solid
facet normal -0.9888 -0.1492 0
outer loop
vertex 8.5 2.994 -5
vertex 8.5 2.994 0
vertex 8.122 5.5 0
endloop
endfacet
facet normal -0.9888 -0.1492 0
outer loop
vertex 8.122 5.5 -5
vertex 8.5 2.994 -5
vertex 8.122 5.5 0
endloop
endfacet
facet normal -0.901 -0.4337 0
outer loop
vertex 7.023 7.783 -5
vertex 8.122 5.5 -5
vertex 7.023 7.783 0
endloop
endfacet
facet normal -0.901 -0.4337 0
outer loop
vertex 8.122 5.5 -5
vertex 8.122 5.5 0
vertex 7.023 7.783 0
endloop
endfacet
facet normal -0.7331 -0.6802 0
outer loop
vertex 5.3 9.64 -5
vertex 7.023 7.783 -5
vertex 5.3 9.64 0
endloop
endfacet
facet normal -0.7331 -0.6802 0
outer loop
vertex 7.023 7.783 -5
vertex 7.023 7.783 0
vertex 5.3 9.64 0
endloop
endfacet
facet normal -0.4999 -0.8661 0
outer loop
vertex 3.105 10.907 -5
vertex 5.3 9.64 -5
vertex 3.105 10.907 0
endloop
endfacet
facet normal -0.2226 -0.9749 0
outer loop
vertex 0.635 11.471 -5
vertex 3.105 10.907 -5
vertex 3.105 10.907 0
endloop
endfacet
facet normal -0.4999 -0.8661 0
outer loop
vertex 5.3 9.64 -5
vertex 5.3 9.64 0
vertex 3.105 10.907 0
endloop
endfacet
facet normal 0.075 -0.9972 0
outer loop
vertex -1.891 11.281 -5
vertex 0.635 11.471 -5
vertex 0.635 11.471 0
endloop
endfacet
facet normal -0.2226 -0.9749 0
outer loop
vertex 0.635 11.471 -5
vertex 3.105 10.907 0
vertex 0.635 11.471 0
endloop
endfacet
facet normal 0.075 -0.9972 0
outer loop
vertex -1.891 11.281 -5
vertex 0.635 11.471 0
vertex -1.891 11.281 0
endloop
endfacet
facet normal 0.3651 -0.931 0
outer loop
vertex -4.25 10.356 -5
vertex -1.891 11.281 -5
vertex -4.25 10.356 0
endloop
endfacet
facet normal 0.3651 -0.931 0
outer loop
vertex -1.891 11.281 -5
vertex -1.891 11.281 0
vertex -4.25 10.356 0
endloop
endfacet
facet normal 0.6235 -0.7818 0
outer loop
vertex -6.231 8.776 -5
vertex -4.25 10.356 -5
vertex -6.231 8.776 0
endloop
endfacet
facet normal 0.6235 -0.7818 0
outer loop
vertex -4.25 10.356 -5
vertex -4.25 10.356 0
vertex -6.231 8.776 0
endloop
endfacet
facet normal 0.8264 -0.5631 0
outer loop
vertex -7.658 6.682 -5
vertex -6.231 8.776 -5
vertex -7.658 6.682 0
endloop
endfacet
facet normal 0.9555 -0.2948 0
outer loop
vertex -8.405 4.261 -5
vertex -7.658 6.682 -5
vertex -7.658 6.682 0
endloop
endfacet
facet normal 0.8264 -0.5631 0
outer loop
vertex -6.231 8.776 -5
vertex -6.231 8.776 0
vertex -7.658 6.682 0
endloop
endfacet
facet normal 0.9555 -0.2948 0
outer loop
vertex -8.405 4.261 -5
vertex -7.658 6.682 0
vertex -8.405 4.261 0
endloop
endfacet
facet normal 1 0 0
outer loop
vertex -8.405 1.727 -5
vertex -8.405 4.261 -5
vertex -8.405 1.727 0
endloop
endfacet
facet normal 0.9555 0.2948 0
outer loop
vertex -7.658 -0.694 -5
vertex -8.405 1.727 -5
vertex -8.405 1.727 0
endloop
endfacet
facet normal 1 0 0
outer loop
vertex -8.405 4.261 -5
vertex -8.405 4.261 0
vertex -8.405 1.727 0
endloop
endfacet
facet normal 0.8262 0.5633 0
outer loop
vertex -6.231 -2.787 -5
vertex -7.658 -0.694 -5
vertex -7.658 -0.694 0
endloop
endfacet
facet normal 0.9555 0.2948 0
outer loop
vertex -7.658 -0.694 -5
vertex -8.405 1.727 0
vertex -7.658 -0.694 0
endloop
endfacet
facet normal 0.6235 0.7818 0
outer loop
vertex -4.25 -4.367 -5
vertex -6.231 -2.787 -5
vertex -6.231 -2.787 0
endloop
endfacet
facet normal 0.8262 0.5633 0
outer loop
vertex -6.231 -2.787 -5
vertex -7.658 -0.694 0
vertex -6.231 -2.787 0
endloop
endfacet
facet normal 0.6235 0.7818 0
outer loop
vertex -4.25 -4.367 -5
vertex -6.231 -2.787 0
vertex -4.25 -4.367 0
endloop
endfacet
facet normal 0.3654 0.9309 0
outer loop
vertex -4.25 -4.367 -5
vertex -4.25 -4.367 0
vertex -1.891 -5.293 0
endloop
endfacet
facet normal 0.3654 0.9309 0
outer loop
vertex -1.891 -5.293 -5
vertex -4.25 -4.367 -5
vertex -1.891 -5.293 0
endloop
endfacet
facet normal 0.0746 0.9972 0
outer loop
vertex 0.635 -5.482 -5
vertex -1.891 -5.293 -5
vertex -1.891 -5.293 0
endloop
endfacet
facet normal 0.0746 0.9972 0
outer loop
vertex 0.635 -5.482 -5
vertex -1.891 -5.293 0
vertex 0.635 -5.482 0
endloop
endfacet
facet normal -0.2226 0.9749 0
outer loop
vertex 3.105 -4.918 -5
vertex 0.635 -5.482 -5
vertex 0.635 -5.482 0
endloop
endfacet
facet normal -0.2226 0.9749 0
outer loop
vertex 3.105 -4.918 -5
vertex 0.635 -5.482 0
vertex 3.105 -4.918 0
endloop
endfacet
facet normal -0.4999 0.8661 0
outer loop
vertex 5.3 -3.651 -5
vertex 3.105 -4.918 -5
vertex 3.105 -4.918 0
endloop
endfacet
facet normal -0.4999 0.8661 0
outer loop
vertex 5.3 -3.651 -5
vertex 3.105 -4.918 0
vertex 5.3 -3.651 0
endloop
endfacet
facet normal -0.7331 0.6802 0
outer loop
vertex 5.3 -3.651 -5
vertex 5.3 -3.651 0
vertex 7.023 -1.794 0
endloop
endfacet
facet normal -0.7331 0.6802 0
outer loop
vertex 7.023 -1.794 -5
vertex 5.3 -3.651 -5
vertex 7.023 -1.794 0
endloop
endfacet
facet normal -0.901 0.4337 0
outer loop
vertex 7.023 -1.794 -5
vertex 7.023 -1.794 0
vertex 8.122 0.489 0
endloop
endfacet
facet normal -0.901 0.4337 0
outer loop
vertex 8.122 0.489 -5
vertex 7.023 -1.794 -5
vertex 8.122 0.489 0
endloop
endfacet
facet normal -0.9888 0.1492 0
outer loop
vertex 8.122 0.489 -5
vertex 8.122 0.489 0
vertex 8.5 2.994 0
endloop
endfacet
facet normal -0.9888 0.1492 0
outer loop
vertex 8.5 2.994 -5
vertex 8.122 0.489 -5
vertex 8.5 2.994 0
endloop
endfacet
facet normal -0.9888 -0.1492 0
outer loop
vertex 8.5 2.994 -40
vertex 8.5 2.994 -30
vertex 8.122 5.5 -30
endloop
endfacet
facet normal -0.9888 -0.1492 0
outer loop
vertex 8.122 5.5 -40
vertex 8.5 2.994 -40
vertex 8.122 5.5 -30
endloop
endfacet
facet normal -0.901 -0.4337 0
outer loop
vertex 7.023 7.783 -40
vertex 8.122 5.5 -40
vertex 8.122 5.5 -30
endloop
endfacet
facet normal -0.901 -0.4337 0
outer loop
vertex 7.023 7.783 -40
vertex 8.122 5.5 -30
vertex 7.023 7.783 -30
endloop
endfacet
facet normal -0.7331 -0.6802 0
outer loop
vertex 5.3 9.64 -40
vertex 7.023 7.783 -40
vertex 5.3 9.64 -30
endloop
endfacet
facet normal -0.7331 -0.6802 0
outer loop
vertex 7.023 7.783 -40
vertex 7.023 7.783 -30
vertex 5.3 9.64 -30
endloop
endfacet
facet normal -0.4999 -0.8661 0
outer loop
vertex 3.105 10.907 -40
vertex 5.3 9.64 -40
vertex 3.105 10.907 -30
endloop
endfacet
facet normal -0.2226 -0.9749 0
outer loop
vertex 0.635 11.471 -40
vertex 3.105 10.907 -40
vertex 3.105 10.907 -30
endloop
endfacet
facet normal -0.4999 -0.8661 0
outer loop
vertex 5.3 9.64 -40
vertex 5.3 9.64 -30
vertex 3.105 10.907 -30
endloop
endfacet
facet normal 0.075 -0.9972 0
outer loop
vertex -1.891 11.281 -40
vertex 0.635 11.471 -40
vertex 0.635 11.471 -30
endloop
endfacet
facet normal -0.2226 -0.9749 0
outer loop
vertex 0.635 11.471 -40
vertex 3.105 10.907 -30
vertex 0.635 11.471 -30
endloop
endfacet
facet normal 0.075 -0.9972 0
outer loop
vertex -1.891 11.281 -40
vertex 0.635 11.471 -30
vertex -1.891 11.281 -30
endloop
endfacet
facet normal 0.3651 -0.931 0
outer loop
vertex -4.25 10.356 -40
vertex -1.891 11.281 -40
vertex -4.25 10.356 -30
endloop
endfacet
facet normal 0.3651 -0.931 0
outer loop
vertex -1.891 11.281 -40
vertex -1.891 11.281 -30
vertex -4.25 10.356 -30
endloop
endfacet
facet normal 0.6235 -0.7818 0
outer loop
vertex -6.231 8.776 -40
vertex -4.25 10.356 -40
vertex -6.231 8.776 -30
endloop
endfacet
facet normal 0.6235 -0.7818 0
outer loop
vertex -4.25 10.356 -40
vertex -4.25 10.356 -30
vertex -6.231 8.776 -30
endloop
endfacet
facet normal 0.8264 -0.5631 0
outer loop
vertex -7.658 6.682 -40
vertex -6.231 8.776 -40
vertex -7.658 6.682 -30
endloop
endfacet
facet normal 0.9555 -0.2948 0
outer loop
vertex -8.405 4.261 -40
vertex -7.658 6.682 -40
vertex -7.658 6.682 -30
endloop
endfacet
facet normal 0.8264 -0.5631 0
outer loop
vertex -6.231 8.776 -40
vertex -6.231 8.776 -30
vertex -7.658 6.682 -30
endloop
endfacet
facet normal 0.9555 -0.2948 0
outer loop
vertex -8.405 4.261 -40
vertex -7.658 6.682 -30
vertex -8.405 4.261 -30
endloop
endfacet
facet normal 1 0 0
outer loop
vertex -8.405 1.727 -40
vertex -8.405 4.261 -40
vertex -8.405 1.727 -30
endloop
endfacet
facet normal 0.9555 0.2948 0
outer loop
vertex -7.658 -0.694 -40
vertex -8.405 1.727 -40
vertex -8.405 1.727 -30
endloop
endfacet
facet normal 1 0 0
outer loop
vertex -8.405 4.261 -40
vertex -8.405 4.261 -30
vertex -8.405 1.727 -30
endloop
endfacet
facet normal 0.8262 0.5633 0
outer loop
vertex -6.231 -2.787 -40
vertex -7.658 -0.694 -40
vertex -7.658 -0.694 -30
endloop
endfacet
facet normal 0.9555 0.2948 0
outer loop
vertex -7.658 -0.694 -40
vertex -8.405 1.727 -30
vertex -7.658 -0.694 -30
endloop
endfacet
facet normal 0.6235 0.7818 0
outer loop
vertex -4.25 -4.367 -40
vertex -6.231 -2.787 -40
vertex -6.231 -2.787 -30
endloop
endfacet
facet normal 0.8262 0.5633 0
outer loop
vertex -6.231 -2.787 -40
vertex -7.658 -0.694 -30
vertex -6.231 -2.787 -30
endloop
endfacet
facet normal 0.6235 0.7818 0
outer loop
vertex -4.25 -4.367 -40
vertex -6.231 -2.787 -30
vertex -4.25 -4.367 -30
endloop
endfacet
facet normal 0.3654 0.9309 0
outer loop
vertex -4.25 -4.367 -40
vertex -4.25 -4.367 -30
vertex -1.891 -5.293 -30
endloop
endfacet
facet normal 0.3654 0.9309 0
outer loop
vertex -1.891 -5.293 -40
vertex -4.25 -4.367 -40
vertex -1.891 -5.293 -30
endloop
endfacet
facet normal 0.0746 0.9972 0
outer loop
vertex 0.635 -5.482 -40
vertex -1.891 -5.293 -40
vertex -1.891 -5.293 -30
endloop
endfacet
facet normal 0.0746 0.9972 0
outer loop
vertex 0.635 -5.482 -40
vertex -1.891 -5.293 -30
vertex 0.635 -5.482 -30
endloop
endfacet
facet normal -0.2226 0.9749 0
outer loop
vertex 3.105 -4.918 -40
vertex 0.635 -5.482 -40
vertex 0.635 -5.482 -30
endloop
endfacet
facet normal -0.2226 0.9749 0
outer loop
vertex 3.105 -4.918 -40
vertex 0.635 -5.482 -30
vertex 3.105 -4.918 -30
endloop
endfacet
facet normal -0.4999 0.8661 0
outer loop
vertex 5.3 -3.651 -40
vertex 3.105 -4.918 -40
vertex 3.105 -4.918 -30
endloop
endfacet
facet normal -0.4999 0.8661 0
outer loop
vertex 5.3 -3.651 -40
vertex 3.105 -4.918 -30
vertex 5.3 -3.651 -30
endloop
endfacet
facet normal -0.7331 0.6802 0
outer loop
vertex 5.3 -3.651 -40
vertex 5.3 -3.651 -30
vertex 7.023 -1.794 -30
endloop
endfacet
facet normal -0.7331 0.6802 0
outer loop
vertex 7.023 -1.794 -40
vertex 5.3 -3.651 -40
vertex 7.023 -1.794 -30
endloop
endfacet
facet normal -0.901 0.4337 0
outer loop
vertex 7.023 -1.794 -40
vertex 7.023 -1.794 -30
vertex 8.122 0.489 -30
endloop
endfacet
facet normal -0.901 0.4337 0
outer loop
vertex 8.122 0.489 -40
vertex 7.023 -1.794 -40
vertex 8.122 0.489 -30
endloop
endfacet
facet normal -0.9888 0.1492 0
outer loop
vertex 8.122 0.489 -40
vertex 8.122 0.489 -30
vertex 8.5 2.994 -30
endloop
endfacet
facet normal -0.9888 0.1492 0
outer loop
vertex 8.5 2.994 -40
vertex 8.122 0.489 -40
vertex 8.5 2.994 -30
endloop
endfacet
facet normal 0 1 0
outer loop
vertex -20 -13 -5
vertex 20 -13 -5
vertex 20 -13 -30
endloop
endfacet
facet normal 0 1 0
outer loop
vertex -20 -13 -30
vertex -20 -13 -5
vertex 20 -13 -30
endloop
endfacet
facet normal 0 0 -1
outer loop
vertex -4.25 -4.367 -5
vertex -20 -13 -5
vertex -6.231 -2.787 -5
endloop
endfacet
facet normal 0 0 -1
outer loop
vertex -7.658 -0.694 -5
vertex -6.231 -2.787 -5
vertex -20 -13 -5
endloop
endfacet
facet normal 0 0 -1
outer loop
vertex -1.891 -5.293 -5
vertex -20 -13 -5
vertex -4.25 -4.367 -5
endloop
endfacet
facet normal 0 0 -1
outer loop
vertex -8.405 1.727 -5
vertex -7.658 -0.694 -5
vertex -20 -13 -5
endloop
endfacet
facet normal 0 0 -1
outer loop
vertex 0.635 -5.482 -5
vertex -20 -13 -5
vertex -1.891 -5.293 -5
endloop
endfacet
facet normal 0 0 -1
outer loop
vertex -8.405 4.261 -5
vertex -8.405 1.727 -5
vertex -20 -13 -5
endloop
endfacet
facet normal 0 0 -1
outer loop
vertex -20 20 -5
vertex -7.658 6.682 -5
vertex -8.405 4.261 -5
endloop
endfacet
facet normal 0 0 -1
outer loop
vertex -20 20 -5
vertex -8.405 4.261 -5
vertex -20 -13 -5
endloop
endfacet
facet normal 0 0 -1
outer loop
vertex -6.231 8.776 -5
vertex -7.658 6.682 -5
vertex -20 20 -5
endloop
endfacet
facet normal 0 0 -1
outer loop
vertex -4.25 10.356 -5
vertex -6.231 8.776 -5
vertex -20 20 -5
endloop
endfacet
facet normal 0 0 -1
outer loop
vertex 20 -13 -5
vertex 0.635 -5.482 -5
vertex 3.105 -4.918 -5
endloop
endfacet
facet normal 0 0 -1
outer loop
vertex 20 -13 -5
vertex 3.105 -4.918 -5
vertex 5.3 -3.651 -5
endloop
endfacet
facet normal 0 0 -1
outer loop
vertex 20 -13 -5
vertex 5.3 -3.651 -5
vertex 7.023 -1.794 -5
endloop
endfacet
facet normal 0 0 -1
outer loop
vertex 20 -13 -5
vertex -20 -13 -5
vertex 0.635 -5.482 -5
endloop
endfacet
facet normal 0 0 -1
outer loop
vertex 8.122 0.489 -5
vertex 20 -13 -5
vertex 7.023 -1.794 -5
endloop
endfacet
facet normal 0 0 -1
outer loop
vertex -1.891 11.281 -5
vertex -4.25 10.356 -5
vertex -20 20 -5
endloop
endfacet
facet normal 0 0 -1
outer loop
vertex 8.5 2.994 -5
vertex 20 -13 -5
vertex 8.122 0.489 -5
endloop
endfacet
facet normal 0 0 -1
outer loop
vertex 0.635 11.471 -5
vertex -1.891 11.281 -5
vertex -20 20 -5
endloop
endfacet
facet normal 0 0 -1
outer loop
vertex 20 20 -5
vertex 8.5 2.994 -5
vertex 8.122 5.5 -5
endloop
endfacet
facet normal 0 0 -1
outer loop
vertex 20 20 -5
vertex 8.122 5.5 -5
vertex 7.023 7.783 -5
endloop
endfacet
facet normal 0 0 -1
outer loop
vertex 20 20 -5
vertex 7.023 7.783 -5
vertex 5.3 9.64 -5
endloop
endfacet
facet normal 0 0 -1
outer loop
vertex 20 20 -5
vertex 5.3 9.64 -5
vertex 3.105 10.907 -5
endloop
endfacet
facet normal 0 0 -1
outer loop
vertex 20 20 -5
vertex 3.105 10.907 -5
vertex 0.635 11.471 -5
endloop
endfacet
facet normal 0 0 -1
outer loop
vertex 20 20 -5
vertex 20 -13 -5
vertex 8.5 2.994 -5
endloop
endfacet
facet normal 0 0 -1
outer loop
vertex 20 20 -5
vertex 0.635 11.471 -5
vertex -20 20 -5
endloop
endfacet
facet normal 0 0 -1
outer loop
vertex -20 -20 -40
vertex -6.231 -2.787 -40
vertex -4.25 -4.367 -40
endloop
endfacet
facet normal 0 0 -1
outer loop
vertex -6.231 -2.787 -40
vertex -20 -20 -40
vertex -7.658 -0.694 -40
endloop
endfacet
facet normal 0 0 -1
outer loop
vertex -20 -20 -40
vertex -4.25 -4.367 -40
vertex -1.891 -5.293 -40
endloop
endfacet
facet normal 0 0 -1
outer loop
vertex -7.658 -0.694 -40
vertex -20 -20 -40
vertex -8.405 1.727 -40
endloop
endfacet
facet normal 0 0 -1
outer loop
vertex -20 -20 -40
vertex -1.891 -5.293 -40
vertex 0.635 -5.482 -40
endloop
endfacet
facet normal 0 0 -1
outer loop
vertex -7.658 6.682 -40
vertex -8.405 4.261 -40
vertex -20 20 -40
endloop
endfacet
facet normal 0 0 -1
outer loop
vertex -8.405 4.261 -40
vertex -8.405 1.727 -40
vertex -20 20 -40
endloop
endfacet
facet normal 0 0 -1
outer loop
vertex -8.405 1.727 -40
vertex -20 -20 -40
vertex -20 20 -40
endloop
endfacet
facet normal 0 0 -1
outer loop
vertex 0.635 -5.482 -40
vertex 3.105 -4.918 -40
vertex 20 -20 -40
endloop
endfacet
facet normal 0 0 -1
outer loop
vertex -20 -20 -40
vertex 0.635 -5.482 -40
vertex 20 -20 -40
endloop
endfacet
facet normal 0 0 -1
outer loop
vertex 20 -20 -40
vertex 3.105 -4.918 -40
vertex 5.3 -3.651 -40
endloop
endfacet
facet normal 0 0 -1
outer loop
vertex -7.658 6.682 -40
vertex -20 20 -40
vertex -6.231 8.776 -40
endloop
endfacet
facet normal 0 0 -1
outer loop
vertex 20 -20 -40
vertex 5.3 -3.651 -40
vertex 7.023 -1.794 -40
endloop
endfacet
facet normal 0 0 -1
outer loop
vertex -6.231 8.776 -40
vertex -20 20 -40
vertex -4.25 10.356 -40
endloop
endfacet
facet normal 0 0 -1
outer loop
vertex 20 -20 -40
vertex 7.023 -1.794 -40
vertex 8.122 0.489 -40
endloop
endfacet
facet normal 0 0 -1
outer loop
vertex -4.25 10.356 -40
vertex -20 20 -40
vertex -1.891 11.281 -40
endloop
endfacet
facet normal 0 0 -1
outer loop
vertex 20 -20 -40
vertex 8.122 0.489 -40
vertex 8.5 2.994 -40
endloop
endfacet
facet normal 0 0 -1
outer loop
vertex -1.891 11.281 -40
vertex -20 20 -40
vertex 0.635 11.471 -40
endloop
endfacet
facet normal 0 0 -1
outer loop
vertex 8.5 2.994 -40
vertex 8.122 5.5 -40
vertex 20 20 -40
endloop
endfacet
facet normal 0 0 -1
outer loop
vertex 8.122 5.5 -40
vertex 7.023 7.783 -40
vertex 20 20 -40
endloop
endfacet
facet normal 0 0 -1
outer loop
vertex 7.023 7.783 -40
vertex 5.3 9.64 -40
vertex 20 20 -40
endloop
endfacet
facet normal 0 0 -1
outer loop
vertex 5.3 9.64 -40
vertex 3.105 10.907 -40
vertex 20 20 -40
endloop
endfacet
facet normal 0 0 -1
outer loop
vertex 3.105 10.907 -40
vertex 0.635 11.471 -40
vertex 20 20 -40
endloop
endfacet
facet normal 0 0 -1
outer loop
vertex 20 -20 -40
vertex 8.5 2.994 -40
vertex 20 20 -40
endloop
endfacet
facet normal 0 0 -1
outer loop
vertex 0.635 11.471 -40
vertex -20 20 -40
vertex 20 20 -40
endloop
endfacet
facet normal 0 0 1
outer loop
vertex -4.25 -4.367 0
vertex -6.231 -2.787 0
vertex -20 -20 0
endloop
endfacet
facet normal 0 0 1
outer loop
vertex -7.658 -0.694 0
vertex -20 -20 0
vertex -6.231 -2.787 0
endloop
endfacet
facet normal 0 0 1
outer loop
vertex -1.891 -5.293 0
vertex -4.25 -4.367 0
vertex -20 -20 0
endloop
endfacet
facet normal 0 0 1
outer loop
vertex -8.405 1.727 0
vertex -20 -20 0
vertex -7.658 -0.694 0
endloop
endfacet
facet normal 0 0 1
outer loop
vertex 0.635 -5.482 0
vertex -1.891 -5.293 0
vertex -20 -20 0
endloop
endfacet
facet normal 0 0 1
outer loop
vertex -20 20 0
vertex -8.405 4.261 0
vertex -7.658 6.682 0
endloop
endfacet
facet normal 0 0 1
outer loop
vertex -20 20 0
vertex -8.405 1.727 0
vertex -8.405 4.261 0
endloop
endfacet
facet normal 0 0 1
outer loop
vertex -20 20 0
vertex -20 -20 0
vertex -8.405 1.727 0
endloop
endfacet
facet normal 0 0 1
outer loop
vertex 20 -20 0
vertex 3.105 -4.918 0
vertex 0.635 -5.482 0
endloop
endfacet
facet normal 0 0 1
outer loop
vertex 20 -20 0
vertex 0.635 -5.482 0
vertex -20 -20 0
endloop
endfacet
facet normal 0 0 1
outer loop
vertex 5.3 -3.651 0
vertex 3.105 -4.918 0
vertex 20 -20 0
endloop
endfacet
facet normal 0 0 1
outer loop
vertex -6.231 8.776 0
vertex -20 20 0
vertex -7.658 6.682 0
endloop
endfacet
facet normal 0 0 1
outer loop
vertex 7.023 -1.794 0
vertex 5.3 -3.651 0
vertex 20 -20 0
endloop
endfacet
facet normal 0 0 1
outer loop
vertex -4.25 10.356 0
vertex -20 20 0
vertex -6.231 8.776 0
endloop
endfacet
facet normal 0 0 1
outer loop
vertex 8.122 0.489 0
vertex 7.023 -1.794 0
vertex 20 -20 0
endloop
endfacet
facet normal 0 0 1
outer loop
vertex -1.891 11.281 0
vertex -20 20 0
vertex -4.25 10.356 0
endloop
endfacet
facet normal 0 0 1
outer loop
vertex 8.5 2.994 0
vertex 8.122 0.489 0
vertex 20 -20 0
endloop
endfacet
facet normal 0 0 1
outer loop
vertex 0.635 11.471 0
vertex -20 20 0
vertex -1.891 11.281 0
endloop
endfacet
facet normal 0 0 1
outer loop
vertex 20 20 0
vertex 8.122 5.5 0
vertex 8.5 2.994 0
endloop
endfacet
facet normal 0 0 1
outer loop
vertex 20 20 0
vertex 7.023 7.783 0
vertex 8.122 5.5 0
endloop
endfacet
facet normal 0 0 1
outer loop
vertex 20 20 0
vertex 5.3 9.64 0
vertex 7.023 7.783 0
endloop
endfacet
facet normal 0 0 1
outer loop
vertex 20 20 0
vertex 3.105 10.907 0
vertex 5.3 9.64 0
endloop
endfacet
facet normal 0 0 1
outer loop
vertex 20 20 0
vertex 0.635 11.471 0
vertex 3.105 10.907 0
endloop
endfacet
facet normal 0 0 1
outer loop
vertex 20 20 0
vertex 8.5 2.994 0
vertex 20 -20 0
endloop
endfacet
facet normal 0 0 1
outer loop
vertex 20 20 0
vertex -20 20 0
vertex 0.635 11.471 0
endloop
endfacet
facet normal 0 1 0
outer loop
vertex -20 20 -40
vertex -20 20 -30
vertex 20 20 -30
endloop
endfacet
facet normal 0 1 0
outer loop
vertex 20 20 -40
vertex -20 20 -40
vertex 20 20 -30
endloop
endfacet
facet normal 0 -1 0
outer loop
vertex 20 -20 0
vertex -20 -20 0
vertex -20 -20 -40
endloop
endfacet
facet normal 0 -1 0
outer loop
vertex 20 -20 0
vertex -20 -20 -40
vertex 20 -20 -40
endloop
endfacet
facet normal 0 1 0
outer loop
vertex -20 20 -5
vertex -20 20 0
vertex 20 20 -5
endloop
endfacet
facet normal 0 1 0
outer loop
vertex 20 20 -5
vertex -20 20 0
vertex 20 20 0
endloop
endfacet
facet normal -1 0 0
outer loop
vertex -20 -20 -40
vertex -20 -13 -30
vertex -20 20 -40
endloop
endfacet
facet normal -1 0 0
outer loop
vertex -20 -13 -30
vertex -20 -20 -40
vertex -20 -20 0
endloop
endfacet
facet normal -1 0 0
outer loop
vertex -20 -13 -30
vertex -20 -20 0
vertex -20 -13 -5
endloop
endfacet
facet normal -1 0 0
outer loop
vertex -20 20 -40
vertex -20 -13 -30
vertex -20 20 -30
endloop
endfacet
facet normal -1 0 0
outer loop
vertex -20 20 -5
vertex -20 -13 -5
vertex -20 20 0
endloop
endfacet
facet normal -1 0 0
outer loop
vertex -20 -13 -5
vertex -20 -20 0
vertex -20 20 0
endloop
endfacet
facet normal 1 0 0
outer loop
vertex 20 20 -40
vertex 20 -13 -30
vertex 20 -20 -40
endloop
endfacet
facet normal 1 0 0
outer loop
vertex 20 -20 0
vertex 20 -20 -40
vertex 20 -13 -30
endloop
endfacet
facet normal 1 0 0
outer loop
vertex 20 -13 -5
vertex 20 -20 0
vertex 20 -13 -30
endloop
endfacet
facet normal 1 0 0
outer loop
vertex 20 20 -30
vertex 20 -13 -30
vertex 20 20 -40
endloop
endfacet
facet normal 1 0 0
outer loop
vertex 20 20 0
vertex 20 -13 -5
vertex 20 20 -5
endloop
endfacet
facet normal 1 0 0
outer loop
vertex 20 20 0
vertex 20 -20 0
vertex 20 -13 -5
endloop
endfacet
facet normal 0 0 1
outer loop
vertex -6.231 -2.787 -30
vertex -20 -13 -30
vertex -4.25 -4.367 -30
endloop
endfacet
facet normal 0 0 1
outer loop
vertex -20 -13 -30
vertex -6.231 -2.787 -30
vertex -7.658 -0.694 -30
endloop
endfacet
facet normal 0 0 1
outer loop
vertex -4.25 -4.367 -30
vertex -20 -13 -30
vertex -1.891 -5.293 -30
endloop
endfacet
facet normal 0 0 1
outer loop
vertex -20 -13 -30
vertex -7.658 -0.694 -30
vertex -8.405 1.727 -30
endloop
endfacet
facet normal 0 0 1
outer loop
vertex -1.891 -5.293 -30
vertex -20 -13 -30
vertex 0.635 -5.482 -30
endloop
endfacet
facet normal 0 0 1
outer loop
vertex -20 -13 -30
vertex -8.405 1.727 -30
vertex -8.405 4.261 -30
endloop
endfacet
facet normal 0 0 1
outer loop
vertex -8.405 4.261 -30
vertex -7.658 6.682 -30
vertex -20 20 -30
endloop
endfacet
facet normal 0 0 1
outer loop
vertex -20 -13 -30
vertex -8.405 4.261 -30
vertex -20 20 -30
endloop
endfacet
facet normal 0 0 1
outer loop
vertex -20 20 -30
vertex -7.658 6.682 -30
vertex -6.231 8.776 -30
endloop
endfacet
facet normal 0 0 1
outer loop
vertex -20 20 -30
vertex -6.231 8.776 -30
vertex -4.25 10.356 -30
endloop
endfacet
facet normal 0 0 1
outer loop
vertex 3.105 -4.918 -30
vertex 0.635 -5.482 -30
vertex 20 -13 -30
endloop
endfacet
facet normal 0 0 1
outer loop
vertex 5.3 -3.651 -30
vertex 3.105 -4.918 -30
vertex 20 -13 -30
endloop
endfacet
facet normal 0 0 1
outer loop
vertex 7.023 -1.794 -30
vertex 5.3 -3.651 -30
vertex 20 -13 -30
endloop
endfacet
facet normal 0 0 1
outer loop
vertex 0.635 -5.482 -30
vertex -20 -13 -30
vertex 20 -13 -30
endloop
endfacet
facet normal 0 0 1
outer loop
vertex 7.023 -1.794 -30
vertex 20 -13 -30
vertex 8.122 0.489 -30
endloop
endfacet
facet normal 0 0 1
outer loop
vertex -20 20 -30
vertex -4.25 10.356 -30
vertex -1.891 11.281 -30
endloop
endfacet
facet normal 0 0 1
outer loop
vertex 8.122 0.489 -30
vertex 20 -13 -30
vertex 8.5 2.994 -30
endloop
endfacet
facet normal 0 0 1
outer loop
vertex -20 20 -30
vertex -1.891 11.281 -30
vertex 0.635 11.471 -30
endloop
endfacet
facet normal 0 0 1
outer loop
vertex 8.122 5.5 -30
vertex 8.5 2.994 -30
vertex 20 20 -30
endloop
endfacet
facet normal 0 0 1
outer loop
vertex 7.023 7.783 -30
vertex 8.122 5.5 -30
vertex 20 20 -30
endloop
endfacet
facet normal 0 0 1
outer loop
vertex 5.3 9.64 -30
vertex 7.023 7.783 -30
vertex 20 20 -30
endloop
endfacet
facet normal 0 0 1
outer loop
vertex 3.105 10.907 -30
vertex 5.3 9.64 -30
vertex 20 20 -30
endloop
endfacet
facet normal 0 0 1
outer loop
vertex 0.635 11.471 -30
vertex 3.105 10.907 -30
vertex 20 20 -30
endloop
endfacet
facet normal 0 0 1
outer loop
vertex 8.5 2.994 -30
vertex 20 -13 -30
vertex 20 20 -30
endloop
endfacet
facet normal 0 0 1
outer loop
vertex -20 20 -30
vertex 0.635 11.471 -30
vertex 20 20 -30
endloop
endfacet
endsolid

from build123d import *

# Parameters (mm, degrees)
SKETCH1_W           = 40
SKETCH1_H           = 40
BOSS_EXTRUDE1_DEPTH = 40
SKETCH2_W           = 25
SKETCH2_H           = 33
CUT_EXTRUDE1_DEPTH  = 62.5
SKETCH3_R           = 8.5
CUT_EXTRUDE2_DEPTH  = 62.5


with BuildPart() as part:
    # Sketch1 → Boss-Extrude1 (new body)
    with BuildSketch(Plane.XY):
        Rectangle(SKETCH1_W, SKETCH1_H)
    extrude(amount=-BOSS_EXTRUDE1_DEPTH)

    # Sketch2 → Cut-Extrude1 (cut)
    with BuildSketch(Plane(origin=(20, 0, 0), x_dir=(0, 0, -1), z_dir=(1, 0, 0))):
        with Locations((17.5, 3.5)):
            Rectangle(SKETCH2_W, SKETCH2_H)
    extrude(amount=-CUT_EXTRUDE1_DEPTH, mode=Mode.SUBTRACT)

    # Sketch3 → Cut-Extrude2 (cut)
    with BuildSketch(Plane.XY):
        with Locations((0, 2.994290039)):
            Circle(SKETCH3_R)
    extrude(amount=-CUT_EXTRUDE2_DEPTH, mode=Mode.SUBTRACT)


solid = part.part
